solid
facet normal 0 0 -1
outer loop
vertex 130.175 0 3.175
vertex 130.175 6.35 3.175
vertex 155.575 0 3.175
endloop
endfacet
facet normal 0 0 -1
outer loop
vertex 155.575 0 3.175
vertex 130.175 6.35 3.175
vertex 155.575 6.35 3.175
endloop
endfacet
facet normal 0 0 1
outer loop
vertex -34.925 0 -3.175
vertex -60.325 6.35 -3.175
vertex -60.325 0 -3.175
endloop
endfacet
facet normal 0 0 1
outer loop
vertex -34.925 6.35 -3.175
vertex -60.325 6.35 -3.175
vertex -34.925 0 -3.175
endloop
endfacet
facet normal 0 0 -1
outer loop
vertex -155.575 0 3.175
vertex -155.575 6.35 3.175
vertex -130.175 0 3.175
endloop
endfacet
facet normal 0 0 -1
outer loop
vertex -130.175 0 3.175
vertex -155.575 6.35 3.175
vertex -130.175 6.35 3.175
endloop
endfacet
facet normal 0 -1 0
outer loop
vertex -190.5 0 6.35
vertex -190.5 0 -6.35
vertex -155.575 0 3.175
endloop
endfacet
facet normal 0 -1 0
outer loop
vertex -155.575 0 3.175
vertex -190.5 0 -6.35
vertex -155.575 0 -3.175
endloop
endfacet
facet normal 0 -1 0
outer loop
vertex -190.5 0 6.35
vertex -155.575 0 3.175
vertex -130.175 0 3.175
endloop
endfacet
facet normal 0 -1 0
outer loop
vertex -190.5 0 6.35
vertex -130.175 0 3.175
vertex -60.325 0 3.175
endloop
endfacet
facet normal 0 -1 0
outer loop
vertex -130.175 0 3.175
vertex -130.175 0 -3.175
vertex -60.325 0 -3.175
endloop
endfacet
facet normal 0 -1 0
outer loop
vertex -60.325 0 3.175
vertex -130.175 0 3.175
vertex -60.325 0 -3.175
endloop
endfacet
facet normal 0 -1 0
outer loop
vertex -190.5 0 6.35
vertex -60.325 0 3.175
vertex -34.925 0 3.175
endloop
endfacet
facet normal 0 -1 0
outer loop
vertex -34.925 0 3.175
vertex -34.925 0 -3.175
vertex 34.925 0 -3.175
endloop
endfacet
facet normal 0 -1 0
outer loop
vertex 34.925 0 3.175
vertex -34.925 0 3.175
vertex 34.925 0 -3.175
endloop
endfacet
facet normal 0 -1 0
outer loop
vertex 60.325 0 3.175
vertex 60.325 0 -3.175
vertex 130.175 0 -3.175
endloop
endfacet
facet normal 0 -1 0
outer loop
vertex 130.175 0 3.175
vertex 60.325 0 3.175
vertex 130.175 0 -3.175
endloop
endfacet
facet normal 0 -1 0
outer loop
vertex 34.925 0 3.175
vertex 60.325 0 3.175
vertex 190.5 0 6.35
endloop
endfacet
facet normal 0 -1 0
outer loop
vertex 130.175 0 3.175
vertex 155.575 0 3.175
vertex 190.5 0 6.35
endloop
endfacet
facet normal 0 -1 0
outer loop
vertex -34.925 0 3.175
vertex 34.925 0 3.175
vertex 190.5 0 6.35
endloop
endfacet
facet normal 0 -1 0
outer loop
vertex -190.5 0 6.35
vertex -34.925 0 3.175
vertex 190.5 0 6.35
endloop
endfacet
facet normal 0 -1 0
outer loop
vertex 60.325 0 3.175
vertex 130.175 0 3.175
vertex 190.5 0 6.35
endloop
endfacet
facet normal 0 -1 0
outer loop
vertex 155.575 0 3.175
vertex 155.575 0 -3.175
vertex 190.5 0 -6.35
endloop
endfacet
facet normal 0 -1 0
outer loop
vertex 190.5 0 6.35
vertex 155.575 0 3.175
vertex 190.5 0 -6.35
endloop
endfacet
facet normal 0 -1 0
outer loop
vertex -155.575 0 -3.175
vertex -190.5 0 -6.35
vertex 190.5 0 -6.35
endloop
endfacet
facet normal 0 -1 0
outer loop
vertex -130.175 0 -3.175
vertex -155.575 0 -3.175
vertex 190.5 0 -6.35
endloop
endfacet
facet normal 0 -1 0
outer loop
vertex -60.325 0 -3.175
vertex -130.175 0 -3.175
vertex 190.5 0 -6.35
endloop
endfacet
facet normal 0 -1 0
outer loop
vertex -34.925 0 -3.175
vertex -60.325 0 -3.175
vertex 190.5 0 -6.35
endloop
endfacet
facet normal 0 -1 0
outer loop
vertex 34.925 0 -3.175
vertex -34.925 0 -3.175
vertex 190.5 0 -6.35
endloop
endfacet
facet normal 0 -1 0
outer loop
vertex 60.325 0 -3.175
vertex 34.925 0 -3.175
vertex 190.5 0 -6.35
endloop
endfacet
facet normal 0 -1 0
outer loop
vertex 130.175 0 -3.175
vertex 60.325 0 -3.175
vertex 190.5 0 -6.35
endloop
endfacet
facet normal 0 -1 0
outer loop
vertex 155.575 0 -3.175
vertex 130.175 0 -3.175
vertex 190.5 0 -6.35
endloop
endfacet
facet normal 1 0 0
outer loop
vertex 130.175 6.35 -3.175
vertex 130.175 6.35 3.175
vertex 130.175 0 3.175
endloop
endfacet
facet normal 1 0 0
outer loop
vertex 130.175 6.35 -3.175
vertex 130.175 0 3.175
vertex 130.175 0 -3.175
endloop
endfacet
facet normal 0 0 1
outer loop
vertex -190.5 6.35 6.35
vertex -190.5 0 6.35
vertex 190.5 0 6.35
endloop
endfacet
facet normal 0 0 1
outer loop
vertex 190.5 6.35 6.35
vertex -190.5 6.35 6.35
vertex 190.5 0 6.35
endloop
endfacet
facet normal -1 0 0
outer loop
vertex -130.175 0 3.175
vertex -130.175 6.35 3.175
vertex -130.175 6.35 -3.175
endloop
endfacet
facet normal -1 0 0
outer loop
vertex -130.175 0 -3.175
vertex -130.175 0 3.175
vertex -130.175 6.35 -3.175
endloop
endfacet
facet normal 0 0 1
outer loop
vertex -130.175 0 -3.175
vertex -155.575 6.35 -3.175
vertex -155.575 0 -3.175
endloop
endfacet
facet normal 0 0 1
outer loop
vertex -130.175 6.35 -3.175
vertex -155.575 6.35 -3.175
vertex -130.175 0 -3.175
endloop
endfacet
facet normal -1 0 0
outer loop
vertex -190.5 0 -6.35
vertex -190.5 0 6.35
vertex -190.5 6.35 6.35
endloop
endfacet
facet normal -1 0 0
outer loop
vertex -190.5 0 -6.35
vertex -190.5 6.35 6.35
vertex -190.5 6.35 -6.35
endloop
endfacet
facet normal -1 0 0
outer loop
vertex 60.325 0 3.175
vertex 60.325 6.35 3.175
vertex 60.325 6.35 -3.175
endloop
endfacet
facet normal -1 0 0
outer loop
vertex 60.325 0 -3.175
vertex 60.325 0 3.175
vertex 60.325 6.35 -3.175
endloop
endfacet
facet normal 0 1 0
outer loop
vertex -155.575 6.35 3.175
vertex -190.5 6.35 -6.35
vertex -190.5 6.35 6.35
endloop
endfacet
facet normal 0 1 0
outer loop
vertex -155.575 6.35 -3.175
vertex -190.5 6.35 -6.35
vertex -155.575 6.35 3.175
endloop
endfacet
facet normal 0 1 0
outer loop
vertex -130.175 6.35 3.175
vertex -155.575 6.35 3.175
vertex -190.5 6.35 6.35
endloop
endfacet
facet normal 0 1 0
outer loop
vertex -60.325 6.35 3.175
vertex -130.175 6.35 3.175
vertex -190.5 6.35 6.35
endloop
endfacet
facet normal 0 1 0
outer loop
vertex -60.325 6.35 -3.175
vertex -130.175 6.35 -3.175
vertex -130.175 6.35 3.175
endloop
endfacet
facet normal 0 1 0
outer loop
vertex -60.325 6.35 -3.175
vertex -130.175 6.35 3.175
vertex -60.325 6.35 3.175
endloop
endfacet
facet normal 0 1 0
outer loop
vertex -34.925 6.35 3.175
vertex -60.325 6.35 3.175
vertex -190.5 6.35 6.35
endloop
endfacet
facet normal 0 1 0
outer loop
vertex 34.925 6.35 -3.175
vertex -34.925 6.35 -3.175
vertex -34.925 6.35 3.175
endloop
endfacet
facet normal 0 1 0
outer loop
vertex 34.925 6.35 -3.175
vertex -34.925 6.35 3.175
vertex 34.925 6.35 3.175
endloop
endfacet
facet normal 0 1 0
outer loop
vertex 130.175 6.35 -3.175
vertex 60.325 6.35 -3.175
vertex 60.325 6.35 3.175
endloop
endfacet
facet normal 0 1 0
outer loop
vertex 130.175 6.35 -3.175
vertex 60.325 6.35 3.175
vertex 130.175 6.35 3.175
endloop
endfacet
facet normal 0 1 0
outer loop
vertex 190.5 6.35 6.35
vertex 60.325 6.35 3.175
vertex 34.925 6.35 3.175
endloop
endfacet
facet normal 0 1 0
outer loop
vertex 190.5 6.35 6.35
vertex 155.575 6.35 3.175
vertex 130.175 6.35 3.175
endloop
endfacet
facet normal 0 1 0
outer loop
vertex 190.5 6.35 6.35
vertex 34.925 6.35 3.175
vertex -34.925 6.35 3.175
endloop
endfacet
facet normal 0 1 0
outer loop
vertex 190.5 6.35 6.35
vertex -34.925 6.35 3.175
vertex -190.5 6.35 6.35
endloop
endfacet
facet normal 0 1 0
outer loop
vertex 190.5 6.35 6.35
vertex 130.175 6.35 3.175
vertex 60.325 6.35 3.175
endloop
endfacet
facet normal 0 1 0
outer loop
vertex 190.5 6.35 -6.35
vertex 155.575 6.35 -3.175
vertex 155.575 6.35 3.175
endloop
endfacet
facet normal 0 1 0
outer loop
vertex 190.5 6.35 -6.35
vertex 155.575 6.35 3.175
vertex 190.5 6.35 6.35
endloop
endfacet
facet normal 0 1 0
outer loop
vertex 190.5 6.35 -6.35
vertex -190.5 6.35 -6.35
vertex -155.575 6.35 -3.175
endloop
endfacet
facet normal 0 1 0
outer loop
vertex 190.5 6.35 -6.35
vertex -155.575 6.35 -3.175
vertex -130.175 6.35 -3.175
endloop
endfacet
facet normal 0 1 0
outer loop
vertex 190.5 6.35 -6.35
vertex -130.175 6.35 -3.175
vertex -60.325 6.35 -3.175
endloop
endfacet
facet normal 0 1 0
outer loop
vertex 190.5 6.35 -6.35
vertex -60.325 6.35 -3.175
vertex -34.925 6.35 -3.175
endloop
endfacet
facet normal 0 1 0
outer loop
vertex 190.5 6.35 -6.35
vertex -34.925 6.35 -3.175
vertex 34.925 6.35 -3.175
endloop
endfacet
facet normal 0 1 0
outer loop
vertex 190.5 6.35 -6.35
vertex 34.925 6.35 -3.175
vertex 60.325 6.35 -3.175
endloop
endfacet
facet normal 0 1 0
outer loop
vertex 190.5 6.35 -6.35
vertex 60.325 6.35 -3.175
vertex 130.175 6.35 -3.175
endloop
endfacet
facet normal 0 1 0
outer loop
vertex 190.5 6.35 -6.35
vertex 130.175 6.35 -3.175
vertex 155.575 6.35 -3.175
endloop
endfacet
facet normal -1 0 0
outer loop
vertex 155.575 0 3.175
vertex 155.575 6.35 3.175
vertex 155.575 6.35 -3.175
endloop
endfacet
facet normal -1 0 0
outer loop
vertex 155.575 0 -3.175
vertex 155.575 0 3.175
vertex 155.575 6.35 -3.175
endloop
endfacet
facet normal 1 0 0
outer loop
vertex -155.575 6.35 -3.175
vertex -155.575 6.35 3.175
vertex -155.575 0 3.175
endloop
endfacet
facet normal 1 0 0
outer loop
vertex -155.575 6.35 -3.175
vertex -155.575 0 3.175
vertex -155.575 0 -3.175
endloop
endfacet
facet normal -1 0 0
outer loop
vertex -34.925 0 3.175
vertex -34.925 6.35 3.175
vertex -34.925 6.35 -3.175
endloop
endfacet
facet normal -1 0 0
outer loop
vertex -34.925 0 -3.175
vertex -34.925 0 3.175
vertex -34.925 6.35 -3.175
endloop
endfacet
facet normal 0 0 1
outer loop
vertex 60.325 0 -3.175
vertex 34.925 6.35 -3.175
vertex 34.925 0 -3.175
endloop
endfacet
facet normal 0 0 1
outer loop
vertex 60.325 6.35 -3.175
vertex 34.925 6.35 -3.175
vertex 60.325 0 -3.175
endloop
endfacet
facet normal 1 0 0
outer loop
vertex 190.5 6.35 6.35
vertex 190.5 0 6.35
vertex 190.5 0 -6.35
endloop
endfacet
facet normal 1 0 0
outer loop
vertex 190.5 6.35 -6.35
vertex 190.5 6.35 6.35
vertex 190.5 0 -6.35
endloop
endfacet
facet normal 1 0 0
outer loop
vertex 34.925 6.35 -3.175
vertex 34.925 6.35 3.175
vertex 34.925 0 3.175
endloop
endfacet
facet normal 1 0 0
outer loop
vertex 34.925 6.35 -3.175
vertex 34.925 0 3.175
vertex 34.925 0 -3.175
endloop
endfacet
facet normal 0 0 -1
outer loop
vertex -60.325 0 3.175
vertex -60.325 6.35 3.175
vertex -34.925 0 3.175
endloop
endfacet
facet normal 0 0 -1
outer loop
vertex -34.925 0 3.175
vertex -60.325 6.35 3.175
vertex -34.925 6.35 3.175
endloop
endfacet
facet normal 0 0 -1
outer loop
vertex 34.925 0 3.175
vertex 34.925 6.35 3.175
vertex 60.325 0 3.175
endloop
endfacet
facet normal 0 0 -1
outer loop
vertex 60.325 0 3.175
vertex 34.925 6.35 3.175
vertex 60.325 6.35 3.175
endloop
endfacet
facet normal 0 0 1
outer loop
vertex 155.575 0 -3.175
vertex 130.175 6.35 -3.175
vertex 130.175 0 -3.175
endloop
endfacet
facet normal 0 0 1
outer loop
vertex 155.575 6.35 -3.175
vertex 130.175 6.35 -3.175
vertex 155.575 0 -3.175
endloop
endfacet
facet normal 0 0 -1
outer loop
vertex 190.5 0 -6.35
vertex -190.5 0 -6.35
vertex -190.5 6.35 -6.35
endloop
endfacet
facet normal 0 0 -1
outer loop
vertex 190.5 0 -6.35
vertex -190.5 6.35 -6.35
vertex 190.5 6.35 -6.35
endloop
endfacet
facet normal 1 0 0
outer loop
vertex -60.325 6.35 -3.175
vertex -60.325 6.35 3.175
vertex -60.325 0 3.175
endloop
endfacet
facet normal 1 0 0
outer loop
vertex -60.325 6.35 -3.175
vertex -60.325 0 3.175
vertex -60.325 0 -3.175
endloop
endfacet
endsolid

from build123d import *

# Parameters (mm, degrees)
SKETCH1_W           = 381
SKETCH1_H           = 12.7
BOSS_EXTRUDE1_DEPTH = 6.35
SKETCH2_W           = 25.4
SKETCH2_H           = 6.35
CUT_EXTRUDE1_DEPTH  = 7.35
LPATTERN1_COUNT     = 4
LPATTERN1_PITCH     = 95.25


with BuildPart() as part:
    # Sketch1 → Boss-Extrude1 (new body)
    with BuildSketch(Plane(origin=(0, 0, 0), x_dir=(1, 0, 0), z_dir=(0, 1, 0))):
        Rectangle(SKETCH1_W, SKETCH1_H)
    extrude(amount=BOSS_EXTRUDE1_DEPTH)

    # Sketch2 → Cut-Extrude1 (cut, through all)
    with BuildSketch(Plane(origin=(0, 6.35, 0), x_dir=(1, 0, 0), z_dir=(0, 1, 0))):
        with Locations((-142.875, 0)):
            Rectangle(SKETCH2_W, SKETCH2_H)
    cut_extrude1 = extrude(amount=-CUT_EXTRUDE1_DEPTH, mode=Mode.SUBTRACT)

    # LPattern1: Cut-Extrude1 ×4
    with Locations(*[(i * LPATTERN1_PITCH, 0, 0) for i in range(1, LPATTERN1_COUNT)]):
        add(cut_extrude1, mode=Mode.SUBTRACT)


solid = part.part
